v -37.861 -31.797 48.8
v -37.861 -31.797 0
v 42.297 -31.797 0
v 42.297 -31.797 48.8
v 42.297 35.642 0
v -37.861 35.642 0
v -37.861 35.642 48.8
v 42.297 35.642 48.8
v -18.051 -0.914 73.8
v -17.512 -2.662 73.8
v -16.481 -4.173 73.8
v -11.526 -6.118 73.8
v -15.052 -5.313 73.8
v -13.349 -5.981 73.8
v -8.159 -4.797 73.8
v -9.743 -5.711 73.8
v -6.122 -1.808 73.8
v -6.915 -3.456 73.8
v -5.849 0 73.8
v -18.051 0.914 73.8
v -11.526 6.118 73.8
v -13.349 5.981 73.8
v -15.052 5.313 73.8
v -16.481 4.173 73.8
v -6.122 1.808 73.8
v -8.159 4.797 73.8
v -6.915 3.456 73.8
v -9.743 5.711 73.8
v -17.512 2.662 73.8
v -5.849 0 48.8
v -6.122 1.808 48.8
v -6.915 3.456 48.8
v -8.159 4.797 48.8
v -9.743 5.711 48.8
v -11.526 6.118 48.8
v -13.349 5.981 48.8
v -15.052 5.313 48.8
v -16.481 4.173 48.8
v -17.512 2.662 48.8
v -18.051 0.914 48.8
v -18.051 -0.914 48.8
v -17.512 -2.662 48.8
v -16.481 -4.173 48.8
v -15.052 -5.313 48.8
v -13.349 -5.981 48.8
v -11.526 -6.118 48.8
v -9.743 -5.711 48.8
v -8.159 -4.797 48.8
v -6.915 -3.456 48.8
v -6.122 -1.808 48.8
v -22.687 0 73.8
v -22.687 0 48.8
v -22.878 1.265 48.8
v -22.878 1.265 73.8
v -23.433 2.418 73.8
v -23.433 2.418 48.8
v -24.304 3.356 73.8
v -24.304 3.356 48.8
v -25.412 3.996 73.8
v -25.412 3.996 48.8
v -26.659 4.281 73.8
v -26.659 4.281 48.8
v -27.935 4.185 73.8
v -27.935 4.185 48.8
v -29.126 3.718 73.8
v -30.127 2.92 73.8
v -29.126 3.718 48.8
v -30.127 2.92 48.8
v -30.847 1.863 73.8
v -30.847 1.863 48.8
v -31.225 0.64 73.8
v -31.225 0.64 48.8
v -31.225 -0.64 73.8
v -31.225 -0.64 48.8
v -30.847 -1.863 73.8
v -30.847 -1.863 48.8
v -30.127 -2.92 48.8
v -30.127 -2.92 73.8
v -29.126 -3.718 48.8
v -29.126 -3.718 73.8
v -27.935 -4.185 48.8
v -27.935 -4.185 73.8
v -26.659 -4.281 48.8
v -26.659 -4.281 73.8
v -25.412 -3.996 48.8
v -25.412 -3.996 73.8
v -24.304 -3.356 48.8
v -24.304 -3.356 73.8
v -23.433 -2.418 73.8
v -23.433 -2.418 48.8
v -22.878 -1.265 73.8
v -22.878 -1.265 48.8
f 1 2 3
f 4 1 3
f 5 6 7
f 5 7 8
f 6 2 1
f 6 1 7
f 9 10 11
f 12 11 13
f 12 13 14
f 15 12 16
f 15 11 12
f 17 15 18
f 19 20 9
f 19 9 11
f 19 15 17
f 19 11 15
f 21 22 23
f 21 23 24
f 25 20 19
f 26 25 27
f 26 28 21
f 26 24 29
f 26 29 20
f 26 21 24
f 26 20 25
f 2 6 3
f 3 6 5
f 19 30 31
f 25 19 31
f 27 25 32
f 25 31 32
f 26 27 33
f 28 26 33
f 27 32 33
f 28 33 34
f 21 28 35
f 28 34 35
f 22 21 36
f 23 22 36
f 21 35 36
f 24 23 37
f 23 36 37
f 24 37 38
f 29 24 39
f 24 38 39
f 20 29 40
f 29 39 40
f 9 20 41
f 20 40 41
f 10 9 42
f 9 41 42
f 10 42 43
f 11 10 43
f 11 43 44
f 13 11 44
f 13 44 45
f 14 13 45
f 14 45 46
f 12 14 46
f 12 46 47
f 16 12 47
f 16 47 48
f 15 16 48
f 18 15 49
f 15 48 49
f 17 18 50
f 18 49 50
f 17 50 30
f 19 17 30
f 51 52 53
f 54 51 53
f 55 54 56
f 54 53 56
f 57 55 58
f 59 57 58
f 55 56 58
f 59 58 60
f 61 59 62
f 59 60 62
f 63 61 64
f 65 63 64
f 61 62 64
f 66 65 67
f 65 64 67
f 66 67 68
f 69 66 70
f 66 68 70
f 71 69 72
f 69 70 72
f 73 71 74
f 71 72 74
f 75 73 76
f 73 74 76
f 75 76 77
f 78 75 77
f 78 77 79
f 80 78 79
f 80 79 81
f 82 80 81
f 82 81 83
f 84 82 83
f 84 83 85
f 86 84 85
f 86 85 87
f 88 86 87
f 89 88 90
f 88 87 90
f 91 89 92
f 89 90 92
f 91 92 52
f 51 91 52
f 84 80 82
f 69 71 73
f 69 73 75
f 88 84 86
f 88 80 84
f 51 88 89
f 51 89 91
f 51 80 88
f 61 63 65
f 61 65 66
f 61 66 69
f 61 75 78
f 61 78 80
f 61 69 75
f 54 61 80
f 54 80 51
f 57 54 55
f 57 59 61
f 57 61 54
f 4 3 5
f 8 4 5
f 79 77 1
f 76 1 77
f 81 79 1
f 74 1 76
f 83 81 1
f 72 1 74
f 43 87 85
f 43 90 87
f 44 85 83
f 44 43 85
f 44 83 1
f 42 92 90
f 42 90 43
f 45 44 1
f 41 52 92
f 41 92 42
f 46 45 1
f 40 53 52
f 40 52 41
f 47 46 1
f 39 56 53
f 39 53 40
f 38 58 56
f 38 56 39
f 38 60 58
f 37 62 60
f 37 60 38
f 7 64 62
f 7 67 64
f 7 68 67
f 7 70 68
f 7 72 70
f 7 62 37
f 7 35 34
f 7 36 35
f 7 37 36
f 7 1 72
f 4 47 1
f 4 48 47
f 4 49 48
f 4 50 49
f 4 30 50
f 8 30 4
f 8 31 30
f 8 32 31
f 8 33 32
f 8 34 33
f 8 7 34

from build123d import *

# Parameters (mm, degrees)
F0_W     = 80.157895
F0_H     = 67.439113
F1_DEPTH = 48.8
F2_W     = 64.96834
F2_H     = 55.503204
F3_DEPTH = 20
F4_R     = 4.292628
F5_DEPTH = 25
F6_R     = 6.135078
F7_DEPTH = 25


with BuildPart() as f1:
    # F0 (on Top) → F1 (new body)
    with BuildSketch(Plane.XY):
        with Locations((2.218393, 1.922605)):
            Rectangle(F0_W, F0_H)
    extrude(amount=F1_DEPTH)

    # F2 (on face) → F3 (join)
    with BuildSketch(Plane.XY.offset(48.8)):
        with Locations((3.307585, 3.803581)):
            Rectangle(F2_W, F2_H)
    extrude(amount=-F3_DEPTH)

    # F4 (on face) → F5 (join)
    with BuildSketch(Plane.XY.offset(48.8)):
        with Locations((-26.979957, 0)):
            Circle(F4_R)
    extrude(amount=F5_DEPTH)

    # F6 (on face) → F7 (join)
    with BuildSketch(Plane.XY.offset(48.8)):
        with Locations((-11.984075, 0)):
            Circle(F6_R)
    extrude(amount=F7_DEPTH)


solid = f1.part
